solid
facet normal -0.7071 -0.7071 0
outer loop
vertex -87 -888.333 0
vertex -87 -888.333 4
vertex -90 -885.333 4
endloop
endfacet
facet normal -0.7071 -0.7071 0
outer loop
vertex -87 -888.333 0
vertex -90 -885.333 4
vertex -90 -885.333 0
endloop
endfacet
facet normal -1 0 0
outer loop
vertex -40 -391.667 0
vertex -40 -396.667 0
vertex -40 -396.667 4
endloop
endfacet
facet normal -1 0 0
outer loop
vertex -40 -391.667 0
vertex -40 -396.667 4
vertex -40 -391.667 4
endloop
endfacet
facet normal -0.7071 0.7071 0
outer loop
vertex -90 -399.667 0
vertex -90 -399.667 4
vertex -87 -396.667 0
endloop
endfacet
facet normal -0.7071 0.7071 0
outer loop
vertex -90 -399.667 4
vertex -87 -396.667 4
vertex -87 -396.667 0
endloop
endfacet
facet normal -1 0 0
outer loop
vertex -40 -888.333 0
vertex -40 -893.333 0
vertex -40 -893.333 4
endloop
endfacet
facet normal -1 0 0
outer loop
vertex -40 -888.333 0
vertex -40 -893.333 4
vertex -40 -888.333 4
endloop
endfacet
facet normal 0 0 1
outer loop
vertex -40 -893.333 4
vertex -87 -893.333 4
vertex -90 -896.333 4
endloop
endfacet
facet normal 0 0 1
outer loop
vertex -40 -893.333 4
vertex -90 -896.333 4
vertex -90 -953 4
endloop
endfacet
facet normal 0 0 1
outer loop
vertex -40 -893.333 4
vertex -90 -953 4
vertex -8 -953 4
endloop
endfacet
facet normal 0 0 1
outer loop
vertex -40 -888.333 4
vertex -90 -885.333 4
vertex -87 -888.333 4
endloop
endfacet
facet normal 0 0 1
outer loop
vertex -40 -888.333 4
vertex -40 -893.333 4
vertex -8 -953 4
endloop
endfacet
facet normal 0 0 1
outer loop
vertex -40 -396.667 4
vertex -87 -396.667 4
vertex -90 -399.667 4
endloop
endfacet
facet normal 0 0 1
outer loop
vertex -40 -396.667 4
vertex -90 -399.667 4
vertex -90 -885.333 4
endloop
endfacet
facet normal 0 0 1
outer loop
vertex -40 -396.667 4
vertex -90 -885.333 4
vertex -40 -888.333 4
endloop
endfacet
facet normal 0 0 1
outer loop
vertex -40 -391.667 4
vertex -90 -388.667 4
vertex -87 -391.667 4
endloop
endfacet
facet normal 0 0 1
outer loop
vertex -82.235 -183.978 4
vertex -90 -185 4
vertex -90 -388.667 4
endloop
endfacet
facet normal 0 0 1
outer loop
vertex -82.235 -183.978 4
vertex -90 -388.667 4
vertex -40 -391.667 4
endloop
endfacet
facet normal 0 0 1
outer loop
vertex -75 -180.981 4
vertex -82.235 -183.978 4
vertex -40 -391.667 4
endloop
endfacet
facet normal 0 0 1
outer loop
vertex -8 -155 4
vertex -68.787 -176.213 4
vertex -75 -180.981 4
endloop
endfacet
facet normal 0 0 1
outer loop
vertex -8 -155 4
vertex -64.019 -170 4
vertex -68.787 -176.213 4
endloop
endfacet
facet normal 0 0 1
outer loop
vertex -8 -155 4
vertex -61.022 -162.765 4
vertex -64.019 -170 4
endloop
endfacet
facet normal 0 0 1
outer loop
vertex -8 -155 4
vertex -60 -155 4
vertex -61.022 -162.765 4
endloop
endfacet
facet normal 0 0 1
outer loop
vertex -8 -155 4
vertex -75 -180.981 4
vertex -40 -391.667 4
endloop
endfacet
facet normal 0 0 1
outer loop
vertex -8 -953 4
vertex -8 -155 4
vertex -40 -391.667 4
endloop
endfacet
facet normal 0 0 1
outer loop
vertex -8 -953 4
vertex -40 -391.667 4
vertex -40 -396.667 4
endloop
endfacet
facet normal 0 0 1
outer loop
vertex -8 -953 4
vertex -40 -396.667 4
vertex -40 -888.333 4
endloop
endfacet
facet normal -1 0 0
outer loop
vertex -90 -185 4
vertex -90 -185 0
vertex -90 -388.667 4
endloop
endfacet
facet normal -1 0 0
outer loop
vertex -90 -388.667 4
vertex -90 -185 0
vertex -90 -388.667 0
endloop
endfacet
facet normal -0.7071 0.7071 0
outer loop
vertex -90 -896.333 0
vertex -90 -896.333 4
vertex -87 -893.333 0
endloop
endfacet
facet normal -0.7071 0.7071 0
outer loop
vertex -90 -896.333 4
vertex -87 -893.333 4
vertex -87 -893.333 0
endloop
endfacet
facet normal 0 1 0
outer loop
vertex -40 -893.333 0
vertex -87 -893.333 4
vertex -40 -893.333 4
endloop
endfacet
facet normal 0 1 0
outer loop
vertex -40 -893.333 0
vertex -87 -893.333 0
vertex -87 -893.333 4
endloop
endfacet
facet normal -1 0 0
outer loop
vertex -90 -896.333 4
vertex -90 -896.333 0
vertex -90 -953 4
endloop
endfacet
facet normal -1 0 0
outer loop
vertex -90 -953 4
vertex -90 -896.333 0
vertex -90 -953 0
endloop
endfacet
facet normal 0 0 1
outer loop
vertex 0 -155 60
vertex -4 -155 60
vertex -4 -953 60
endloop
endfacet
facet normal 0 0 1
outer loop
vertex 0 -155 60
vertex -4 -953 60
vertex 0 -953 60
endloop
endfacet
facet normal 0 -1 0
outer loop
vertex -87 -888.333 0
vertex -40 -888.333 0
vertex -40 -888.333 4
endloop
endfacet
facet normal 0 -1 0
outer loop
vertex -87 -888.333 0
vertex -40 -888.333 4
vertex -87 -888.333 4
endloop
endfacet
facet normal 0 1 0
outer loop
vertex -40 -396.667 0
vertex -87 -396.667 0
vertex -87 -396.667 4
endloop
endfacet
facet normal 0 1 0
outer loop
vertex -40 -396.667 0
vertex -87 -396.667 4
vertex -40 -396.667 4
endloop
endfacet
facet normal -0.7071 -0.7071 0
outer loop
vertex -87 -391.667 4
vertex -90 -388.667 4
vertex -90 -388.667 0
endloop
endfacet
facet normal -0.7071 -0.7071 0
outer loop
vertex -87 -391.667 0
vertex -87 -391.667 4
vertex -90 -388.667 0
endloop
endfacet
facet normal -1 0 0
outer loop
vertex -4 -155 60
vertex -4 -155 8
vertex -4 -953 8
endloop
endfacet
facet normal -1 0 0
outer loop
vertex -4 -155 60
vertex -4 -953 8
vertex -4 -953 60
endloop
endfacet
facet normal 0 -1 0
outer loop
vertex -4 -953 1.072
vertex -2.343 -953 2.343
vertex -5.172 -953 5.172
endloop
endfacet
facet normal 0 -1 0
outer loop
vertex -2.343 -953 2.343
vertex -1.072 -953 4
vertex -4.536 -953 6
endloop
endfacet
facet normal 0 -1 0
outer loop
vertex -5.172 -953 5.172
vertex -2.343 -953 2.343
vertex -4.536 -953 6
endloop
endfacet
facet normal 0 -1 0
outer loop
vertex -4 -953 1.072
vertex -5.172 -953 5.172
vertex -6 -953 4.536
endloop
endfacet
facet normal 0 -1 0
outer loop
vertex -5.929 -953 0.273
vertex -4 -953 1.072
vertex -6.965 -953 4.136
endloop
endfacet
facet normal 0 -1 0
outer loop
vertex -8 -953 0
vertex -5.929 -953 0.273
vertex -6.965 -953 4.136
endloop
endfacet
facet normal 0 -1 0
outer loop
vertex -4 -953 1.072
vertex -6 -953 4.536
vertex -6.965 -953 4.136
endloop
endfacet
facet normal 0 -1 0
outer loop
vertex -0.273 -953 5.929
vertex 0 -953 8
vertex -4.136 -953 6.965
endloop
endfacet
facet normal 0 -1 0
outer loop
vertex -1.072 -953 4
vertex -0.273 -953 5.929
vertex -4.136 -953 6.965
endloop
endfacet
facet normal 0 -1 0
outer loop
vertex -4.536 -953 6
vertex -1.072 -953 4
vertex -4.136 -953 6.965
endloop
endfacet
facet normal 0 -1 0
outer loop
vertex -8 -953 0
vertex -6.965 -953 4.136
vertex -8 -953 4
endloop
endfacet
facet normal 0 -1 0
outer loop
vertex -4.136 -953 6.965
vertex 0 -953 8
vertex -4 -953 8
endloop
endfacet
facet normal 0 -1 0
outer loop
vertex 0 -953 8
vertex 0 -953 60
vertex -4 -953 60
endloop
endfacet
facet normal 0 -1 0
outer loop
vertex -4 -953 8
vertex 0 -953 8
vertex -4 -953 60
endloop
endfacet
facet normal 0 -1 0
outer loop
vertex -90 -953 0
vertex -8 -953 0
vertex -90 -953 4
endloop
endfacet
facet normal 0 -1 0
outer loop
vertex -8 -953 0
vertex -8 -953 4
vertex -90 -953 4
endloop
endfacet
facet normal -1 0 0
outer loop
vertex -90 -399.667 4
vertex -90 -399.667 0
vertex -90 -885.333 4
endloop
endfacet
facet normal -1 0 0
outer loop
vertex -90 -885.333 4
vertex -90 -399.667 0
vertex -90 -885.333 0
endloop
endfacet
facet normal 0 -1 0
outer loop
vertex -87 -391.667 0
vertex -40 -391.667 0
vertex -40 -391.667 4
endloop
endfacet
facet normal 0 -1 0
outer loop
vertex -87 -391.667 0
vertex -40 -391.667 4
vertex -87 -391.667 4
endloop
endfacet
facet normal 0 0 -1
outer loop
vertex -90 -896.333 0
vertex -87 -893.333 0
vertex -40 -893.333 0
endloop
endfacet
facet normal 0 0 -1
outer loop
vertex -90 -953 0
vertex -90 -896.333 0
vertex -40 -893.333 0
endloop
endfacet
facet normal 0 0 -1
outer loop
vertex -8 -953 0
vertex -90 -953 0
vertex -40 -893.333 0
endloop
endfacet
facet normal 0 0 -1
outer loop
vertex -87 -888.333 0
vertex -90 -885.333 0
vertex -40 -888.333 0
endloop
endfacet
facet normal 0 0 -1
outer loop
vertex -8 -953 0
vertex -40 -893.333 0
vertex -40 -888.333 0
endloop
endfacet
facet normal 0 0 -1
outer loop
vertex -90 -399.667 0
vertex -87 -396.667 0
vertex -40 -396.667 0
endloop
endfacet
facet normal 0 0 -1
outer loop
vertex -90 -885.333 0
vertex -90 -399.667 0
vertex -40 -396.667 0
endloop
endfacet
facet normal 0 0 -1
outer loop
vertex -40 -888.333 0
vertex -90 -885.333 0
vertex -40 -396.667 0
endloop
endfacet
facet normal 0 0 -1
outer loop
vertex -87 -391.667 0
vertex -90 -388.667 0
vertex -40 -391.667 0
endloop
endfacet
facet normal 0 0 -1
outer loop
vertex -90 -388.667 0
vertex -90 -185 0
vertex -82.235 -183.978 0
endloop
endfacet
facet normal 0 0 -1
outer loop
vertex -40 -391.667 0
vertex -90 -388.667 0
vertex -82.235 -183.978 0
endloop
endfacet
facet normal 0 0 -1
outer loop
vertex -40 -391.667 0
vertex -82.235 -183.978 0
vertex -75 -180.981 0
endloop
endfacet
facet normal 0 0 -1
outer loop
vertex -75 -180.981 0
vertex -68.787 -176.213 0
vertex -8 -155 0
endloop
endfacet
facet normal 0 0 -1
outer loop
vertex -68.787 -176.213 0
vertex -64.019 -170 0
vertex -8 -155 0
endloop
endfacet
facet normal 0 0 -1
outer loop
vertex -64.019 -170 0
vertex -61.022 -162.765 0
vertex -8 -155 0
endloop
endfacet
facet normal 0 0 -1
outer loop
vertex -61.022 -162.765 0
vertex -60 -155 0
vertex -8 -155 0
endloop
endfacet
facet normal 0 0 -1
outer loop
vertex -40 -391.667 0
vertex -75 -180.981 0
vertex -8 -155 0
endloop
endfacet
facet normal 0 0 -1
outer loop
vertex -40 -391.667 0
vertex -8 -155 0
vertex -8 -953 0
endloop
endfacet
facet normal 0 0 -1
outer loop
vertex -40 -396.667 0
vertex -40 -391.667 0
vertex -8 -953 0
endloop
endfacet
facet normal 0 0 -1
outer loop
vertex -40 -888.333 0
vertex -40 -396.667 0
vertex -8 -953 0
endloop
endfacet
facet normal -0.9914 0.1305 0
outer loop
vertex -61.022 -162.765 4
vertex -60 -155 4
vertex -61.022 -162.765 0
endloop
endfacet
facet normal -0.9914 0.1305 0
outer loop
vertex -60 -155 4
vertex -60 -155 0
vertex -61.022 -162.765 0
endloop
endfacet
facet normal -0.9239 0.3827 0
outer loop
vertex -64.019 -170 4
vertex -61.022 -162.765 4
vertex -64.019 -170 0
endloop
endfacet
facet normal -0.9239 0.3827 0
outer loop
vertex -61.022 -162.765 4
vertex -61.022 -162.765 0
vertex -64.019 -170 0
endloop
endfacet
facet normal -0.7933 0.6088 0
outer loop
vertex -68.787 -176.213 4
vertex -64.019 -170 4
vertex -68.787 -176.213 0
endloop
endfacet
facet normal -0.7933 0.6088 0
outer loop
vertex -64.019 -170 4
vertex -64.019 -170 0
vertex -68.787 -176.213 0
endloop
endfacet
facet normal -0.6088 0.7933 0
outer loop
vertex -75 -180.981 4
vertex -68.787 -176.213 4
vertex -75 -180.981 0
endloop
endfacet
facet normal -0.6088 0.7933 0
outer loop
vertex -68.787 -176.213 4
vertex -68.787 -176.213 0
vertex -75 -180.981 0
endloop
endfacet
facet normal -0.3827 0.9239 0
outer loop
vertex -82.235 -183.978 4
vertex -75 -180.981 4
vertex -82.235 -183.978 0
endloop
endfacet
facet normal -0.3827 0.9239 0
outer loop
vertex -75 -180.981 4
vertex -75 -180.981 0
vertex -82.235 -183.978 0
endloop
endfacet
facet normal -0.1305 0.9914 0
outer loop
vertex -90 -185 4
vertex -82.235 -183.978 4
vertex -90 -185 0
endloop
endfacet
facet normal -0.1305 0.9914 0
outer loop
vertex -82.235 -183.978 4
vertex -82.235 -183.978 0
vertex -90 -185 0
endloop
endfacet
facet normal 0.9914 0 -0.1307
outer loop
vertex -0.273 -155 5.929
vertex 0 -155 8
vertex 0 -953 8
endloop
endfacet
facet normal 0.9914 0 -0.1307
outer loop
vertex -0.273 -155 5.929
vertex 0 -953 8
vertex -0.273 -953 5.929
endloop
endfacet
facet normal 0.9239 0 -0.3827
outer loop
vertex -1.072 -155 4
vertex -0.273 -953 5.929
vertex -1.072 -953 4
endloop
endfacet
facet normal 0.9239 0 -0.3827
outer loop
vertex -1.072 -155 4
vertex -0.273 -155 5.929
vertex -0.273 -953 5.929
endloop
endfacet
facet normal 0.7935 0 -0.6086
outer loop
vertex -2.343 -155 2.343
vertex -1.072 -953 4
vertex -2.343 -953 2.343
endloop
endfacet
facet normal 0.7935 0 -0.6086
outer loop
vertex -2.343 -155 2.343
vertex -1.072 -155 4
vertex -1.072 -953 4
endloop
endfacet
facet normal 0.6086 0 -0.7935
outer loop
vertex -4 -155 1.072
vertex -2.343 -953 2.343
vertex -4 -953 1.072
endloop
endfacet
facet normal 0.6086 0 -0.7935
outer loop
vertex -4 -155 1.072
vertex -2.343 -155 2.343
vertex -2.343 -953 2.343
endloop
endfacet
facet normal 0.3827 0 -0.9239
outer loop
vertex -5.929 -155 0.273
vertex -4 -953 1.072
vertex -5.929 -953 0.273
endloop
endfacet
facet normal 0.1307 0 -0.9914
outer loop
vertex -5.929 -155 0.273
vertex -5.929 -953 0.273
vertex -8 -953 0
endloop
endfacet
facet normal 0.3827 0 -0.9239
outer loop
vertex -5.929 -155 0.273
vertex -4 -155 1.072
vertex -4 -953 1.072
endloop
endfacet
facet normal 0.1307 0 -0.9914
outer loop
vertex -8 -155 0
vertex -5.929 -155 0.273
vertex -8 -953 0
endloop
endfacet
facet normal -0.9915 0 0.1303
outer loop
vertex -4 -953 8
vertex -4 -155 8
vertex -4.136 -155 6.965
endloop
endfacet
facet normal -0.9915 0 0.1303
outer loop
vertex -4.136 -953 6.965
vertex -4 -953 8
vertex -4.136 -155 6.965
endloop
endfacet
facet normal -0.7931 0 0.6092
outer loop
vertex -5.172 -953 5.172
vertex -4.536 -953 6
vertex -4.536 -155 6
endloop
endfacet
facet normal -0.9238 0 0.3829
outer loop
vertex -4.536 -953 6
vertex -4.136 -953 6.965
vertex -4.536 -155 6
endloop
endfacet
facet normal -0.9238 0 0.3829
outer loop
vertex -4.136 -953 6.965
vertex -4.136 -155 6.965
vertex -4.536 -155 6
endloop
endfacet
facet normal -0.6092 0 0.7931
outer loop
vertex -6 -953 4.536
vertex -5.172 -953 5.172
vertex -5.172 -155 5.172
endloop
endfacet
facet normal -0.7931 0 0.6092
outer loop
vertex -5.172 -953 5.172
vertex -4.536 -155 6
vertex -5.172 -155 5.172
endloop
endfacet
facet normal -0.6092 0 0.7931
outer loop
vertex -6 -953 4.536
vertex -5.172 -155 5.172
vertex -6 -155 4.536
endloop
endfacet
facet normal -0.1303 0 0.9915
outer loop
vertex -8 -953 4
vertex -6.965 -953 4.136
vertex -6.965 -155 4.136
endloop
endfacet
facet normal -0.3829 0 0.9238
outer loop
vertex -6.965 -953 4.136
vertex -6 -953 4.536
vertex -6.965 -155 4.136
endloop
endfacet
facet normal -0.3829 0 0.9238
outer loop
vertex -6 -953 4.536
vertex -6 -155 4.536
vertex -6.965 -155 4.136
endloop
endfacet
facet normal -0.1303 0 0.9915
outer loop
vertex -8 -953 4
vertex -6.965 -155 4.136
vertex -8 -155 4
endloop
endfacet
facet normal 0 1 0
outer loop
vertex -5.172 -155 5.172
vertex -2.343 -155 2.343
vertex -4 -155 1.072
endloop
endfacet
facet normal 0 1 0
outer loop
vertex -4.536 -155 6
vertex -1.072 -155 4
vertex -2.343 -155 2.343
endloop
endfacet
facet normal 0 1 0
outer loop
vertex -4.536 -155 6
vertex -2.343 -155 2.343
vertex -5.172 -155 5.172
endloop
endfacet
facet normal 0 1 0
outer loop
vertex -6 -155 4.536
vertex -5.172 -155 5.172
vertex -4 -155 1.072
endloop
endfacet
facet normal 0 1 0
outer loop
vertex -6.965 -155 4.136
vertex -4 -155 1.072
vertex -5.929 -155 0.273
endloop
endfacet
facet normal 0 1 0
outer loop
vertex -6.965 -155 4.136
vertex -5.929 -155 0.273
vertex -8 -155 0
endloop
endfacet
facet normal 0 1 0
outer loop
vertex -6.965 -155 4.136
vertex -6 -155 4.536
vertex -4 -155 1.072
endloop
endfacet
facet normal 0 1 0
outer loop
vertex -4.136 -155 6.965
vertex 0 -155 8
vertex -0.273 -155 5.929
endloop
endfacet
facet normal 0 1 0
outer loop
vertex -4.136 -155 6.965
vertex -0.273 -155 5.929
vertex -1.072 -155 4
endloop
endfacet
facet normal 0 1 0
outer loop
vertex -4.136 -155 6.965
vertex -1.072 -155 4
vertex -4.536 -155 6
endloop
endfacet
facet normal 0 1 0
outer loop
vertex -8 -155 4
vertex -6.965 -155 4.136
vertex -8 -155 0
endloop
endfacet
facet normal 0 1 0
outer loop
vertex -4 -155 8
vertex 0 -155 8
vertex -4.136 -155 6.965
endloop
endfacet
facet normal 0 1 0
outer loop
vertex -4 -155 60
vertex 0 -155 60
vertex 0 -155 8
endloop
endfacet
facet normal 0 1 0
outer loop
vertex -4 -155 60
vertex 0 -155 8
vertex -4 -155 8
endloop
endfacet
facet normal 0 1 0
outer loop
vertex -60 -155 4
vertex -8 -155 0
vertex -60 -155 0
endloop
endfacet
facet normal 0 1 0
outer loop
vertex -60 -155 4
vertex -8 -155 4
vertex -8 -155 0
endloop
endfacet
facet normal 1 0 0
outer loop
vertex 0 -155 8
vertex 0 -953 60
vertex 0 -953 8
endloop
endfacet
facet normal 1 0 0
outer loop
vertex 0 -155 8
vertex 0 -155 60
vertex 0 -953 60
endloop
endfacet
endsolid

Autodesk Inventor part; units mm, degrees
ref_plane "YZ Plane" through (0, 0, 0) normal (1, 0, 0) x (0, 1, 0)
ref_plane "XZ Plane" through (0, 0, 0) normal (0, 1, 0) x (-1, 0, 0)
ref_plane "XY Plane" through (0, 0, 0) normal (0, 0, 1) x (1, 0, 0)
sketch "Sketch1" plane through (0, 0, 0) normal (0, 0, 1) x (1, 0, 0)
  line L0 (0, 0) -> (-90, 0)
  line L1 (-90, 0) -> (-90, -1490)
  line L2 (-90, -1490) -> (0, -1490)
  line L3 (0, -1490) -> (0, 0)
  line L4 (-90, -1390) -> (-40, -1390)
  line L5 (-40, -1390) -> (-40, -1385)
  line L6 (-40, -1385) -> (-90, -1385)
  line L7 (-90, -1385) -> (-90, -1390)
  line L8 (-90, -893.3333) -> (-40, -893.3333)
  line L9 (-40, -893.3333) -> (-40, -888.3333)
  line L10 (-40, -888.3333) -> (-90, -888.3333)
  line L11 (-90, -888.3333) -> (-90, -893.3333)
  line L12 (-90, -396.6667) -> (-40, -396.6667)
  line L13 (-40, -396.6667) -> (-40, -391.6667)
  line L14 (-40, -391.6667) -> (-90, -391.6667)
  line L15 (-90, -391.6667) -> (-90, -396.6667)
  circle A0 centre (-90, -155) radius 30
  line L16 (-90, -155) -> (0, -155)
  line L17 (-90, -953) -> (0, -953)
  point P0 (-90, -391.6667)
  point P1 (-90, -396.6667)
  point P2 (-90, -888.3333)
  point P3 (-90, -893.3333)
  point P4 (-90, -125)
  point P5 (-90, -185)
  point P6 (-60, -155)
  dimension "d0" = 1490
  dimension "d1" = 90
  dimension "d2" = 5
  dimension "d4" = 100
  dimension "d7" = 496.6667
  dimension "d23" = 40
  dimension "d28" = 60
  dimension "d30" = 1335
  dimension "d31" = 953
extrude "Plate1" add sketch "Sketch1" along normal blind 4 contours L3 L17 L1 L8 L9 L10 L12 L13 L14 A0 L16
sketch "Sketch2" plane through (-4, -155, 0) normal (1, 0, 0) x (0, 1, 0)
  line L0 (-798, 0) -> (0, 0)
  line L1 (0, 0) -> (0, 60)
  line L2 (0, 60) -> (-798, 60)
  line L3 (-798, 60) -> (-798, 0)
edge flange "Flange1" height 60 angle 90 thickness 4 bend radius 4 thickness toward (1, 0, 0) relief tear relief width 4 relief depth 2 edges at (0, -554, 4) wall of the first edge with corners at (-4, -953, 0) (-4, -155, 0) (-4, -155, 60) (-4, -953, 60)
bend "Bend1"
corner "Corner1"
chamfer "Corner Chamfer1" distance 3 angle 45 4 edges at (-90, -893.3333, 2) (-90, -888.3333, 2) (-90, -391.6667, 2) (-90, -396.6667, 2)
equation "\"d0\" = Стрингер_длина"
equation "\"d2\" = паз_под_стрингер_толщина"
equation "\"d7\" = Шаг_шпангоутов"
equation "\"d28\" = 2 * радиус_выреза_под_сварку"
equation "\"d12\" = Thickness"
equation "\"d13\" = BendReliefWidth"
equation "\"d14\" = BendReliefDepth"
equation "\"d15\" = MinimumRemnant"
equation "\"d16\" = TransitionRadius"
equation "\"d17\" = ребро_усилителей"
equation "\"d19\" = BendRadius"
equation "\"d20\" = CornerReliefSize"
equation "\"d21\" = GapSize"
equation "\"d22\" = JacobiRadiusSize"
equation "\"BendRadius\" = Thickness"
equation "\"BendReliefWidth\" = Thickness"
equation "\"BendReliefDepth\" = 0.5 * Thickness"
equation "\"CornerReliefSize\" = 4 * Thickness"
equation "\"MinimumRemnant\" = 2 * Thickness"
equation "\"TransitionRadius\" = BendRadius"
equation "\"JacobiRadiusSize\" = BendRadius"
equation "\"GapSize\" = Thickness"
equation "\"Стрингер_длина\" = 1490"
equation "\"паз_под_стрингер_толщина\" = 5"
equation "\"Шаг_шпангоутов\" = 496.666667"
equation "\"радиус_выреза_под_сварку\" = 30"
equation "\"Thickness\" = 4"
equation "\"ребро_усилителей\" = 60"
properties part number "GBK 0103 stringer 2_Dummy" material "Steel"
